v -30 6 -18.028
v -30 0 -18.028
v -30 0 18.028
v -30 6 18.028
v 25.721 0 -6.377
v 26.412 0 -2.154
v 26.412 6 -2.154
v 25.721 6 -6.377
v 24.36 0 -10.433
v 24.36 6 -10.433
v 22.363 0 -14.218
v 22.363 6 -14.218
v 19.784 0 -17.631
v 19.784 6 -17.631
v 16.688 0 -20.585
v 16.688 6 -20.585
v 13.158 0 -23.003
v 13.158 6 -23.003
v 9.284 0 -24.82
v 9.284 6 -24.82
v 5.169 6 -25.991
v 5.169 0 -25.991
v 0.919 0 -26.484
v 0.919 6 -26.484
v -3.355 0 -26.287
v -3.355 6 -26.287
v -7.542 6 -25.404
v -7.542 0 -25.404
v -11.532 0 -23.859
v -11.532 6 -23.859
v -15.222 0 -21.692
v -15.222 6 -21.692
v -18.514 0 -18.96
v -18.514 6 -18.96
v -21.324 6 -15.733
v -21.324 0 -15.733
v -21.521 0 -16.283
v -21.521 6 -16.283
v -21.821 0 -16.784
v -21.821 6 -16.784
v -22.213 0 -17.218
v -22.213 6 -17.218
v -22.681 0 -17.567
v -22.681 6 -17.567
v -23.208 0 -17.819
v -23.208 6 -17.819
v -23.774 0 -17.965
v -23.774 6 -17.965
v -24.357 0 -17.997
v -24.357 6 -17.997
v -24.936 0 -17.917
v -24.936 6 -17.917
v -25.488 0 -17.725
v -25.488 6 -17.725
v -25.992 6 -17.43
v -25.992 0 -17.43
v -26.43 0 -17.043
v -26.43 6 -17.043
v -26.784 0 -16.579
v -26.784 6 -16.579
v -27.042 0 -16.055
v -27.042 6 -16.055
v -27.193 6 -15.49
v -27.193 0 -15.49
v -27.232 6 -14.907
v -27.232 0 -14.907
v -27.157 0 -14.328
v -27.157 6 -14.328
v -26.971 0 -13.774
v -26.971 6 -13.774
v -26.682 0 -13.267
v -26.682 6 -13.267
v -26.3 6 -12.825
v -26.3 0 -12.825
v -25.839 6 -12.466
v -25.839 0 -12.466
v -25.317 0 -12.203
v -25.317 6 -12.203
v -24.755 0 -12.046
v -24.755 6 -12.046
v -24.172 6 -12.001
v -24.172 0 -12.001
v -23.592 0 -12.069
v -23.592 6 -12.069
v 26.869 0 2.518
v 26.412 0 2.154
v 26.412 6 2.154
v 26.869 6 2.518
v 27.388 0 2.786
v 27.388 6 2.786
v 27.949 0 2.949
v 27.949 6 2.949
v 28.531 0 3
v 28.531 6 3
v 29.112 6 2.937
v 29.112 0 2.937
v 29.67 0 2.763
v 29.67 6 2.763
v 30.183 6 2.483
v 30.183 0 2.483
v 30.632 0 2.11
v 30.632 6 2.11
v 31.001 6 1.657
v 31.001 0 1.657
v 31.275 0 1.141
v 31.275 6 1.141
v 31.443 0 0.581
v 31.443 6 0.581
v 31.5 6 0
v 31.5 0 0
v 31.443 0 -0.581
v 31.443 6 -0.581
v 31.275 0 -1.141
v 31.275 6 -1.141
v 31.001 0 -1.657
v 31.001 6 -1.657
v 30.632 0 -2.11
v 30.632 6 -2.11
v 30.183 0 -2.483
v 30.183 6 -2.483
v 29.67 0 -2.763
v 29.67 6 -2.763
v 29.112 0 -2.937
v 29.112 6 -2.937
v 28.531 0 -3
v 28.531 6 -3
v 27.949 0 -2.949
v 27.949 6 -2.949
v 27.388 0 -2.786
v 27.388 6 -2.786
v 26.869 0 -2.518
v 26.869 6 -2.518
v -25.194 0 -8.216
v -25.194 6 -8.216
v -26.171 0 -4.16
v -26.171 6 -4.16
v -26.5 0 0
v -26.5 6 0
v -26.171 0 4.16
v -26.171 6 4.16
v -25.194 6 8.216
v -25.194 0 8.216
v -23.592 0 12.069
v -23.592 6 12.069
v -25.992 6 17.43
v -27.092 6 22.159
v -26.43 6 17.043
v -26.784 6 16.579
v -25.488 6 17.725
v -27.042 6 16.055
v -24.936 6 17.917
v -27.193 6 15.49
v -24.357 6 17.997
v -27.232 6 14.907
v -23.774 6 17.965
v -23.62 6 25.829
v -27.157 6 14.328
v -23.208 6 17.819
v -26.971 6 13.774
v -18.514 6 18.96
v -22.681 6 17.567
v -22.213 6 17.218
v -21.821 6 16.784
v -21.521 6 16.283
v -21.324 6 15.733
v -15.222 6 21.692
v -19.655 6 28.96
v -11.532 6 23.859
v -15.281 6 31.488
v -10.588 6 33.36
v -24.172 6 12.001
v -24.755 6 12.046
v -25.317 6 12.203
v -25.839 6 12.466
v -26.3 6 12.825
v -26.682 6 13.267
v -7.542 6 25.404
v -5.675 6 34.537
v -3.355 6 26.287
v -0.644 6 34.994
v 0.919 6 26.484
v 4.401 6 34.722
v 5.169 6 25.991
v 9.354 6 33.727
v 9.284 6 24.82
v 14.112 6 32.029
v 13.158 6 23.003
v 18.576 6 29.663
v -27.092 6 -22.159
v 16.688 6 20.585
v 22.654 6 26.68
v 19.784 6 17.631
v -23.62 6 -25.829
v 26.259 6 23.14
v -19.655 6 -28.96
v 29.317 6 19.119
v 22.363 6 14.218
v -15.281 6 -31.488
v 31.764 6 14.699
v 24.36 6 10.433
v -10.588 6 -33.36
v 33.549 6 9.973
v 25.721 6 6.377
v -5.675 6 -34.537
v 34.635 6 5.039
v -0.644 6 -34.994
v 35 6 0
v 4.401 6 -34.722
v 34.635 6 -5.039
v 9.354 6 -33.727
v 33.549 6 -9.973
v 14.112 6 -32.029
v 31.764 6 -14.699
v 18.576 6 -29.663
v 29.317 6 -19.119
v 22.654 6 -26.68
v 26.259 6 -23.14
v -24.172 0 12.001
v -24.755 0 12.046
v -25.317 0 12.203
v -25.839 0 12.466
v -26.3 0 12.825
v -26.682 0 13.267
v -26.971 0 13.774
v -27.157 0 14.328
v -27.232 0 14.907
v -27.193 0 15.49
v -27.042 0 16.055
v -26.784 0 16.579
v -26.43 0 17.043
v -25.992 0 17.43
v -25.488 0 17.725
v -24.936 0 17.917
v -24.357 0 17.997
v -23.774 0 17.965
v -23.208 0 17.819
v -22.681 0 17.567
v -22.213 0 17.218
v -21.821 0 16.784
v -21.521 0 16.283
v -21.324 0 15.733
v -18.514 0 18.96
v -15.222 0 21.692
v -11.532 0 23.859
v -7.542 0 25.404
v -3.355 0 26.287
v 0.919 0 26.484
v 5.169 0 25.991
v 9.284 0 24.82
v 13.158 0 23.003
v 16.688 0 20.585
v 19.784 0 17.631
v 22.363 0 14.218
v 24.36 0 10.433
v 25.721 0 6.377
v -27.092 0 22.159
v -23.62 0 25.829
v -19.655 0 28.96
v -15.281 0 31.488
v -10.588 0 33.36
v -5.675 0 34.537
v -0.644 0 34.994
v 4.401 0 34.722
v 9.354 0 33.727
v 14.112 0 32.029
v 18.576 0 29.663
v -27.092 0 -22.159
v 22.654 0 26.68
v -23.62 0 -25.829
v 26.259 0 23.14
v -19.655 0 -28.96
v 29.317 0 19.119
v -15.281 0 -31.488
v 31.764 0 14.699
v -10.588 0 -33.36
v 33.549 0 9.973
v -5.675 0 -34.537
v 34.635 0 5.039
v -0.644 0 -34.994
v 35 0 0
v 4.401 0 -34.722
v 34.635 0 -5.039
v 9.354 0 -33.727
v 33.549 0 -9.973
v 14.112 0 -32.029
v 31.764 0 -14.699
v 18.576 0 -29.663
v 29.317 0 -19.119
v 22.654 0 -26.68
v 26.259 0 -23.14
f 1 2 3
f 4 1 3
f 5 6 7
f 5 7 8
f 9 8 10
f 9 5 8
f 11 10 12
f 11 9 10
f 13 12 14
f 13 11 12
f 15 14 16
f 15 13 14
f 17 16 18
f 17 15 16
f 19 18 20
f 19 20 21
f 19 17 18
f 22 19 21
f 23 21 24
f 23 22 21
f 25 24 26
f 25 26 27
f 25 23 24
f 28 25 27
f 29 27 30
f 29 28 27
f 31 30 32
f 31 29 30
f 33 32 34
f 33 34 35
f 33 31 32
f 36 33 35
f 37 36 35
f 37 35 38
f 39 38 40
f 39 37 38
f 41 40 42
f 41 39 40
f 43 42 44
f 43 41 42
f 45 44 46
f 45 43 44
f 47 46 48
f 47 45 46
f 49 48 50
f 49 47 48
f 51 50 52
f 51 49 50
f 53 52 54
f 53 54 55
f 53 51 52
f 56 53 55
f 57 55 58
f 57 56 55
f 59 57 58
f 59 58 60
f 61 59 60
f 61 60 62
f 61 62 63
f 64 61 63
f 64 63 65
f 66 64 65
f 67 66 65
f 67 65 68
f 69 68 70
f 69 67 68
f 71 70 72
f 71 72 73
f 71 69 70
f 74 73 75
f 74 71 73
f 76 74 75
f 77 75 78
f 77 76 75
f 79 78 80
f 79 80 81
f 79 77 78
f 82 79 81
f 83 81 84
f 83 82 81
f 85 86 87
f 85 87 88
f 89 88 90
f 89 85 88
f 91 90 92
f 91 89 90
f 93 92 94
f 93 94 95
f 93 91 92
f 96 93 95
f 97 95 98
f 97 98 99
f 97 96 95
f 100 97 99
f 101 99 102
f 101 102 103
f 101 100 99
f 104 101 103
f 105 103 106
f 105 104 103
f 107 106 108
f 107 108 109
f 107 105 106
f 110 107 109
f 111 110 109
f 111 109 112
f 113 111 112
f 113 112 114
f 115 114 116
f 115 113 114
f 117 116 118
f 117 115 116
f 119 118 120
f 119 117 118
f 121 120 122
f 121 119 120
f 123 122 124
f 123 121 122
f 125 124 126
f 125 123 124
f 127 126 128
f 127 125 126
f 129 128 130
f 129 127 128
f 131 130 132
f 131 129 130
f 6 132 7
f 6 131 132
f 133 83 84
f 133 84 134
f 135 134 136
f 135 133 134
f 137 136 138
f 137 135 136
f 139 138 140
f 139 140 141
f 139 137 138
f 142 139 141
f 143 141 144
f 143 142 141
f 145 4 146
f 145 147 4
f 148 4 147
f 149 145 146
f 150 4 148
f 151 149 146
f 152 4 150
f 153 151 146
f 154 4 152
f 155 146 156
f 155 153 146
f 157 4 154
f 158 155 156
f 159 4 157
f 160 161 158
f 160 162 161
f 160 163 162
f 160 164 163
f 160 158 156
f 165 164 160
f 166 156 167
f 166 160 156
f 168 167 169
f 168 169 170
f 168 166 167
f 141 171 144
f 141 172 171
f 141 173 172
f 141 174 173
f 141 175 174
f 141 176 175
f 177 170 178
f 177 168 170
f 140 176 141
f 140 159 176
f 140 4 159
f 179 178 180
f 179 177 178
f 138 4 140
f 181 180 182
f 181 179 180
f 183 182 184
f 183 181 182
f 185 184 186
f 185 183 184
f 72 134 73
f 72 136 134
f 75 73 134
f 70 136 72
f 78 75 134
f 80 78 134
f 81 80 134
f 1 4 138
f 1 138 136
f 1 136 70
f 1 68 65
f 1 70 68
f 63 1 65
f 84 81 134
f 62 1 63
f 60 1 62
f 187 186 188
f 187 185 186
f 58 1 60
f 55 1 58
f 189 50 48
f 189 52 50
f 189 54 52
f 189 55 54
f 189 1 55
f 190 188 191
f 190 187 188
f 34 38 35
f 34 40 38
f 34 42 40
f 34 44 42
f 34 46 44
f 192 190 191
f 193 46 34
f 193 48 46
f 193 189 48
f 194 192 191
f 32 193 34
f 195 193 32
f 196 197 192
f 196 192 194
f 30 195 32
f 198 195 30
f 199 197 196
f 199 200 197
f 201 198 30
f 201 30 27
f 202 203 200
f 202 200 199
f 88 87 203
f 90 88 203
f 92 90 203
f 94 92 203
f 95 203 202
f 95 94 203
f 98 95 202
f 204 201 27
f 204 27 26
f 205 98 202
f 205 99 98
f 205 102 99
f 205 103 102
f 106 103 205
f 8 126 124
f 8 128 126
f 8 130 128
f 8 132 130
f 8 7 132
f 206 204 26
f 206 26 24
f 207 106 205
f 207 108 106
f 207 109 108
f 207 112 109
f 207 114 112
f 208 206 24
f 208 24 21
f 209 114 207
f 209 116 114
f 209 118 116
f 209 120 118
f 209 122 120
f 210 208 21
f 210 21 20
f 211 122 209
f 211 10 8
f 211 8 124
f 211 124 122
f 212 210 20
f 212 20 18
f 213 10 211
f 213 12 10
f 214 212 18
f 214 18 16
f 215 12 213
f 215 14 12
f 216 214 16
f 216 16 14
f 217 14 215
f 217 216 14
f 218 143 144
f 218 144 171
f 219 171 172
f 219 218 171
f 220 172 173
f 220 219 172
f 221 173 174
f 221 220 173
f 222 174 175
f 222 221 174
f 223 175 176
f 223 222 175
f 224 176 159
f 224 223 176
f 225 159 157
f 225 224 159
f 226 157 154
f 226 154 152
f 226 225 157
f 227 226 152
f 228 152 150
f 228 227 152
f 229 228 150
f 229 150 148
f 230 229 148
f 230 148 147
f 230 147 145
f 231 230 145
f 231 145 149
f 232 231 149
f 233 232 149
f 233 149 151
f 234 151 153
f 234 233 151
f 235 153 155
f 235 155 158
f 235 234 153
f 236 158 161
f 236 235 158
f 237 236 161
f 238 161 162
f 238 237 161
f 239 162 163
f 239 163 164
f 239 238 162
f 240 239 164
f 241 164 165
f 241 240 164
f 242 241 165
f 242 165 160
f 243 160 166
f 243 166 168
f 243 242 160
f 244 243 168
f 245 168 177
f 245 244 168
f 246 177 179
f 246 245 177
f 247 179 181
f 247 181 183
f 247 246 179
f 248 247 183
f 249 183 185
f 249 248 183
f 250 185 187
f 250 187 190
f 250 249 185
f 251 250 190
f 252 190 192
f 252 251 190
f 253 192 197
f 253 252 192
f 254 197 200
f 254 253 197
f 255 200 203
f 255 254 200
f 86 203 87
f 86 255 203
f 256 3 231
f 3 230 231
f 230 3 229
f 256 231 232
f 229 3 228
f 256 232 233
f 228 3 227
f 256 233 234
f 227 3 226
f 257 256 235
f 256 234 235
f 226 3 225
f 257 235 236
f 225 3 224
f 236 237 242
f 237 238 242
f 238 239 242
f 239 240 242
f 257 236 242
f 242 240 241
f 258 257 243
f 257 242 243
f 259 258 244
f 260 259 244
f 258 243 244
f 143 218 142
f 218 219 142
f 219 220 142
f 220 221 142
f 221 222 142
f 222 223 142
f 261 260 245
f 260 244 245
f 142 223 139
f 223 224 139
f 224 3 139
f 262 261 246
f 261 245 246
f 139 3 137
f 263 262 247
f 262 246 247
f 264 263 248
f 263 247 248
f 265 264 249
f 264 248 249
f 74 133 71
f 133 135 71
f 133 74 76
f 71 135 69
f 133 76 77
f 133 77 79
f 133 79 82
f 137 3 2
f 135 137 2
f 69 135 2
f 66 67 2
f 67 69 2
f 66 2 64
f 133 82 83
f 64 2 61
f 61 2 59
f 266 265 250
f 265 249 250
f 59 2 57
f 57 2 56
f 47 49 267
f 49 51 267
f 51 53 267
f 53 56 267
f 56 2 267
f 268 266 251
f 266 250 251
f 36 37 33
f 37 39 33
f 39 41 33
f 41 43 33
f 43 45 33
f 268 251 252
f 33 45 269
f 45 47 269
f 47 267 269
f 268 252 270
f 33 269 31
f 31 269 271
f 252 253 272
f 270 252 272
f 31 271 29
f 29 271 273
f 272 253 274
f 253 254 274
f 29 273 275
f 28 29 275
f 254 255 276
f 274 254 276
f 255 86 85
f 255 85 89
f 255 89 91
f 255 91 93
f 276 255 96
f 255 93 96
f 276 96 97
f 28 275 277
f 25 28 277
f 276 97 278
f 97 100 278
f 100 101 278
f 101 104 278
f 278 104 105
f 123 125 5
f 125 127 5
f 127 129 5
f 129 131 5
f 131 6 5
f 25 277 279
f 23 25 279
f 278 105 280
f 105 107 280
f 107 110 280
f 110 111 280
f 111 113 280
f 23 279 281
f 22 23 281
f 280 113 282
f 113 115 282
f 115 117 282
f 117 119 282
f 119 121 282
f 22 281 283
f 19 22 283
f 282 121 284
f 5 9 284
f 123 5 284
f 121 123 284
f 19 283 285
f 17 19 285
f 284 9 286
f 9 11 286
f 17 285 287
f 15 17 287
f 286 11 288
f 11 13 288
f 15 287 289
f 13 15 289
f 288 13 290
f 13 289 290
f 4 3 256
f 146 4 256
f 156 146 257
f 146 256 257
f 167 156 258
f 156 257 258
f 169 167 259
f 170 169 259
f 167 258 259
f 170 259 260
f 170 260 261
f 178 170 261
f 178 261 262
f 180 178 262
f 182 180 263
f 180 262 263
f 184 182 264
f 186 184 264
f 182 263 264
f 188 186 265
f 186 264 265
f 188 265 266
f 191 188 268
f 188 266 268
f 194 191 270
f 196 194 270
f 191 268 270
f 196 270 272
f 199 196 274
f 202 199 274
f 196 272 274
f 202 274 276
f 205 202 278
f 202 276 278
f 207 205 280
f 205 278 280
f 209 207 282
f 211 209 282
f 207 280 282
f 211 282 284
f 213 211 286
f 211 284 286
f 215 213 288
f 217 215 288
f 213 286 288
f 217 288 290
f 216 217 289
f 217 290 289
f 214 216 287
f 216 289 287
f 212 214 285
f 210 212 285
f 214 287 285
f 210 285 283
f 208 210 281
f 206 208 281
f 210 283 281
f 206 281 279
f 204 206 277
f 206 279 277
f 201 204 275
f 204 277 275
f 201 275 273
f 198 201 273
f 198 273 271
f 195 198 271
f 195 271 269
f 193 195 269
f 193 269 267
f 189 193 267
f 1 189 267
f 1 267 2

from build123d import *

# Parameters (mm, degrees)
EXTRUDE_1_DEPTH = 6


with BuildPart() as part:
    # 草图1 → 凸台-拉伸1 (new body)
    with BuildSketch(Plane(origin=(0, 0, 0), x_dir=(1, 0, 0), z_dir=(0, 1, 0))):
        with BuildLine():
            Line((-30, 18.027756377), (-30, -18.027756377))
            ThreePointArc((-30, -18.027756377), (35, 0), (-30, 18.027756377))
        make_face()
        with BuildLine():
            ThreePointArc((-21.324183136, 15.733061163), (-26.784109172, 16.578947368), (-23.591969867, 12.069339576))
            ThreePointArc((-23.591969867, 12.069339576), (-26.5, 0), (-23.591969867, -12.069339576))
            ThreePointArc((-23.591969867, -12.069339576), (-26.784109172, -16.578947368), (-21.324183136, -15.733061163))
            ThreePointArc((-21.324183136, -15.733061163), (7.250324934, -25.488875777), (26.412280702, -2.154397394))
            ThreePointArc((26.412280702, -2.154397394), (31.5, 0), (26.412280702, 2.154397394))
            ThreePointArc((26.412280702, 2.154397394), (7.250324934, 25.488875777), (-21.324183136, 15.733061163))
        make_face(mode=Mode.SUBTRACT)
    extrude(amount=EXTRUDE_1_DEPTH)


solid = part.part
